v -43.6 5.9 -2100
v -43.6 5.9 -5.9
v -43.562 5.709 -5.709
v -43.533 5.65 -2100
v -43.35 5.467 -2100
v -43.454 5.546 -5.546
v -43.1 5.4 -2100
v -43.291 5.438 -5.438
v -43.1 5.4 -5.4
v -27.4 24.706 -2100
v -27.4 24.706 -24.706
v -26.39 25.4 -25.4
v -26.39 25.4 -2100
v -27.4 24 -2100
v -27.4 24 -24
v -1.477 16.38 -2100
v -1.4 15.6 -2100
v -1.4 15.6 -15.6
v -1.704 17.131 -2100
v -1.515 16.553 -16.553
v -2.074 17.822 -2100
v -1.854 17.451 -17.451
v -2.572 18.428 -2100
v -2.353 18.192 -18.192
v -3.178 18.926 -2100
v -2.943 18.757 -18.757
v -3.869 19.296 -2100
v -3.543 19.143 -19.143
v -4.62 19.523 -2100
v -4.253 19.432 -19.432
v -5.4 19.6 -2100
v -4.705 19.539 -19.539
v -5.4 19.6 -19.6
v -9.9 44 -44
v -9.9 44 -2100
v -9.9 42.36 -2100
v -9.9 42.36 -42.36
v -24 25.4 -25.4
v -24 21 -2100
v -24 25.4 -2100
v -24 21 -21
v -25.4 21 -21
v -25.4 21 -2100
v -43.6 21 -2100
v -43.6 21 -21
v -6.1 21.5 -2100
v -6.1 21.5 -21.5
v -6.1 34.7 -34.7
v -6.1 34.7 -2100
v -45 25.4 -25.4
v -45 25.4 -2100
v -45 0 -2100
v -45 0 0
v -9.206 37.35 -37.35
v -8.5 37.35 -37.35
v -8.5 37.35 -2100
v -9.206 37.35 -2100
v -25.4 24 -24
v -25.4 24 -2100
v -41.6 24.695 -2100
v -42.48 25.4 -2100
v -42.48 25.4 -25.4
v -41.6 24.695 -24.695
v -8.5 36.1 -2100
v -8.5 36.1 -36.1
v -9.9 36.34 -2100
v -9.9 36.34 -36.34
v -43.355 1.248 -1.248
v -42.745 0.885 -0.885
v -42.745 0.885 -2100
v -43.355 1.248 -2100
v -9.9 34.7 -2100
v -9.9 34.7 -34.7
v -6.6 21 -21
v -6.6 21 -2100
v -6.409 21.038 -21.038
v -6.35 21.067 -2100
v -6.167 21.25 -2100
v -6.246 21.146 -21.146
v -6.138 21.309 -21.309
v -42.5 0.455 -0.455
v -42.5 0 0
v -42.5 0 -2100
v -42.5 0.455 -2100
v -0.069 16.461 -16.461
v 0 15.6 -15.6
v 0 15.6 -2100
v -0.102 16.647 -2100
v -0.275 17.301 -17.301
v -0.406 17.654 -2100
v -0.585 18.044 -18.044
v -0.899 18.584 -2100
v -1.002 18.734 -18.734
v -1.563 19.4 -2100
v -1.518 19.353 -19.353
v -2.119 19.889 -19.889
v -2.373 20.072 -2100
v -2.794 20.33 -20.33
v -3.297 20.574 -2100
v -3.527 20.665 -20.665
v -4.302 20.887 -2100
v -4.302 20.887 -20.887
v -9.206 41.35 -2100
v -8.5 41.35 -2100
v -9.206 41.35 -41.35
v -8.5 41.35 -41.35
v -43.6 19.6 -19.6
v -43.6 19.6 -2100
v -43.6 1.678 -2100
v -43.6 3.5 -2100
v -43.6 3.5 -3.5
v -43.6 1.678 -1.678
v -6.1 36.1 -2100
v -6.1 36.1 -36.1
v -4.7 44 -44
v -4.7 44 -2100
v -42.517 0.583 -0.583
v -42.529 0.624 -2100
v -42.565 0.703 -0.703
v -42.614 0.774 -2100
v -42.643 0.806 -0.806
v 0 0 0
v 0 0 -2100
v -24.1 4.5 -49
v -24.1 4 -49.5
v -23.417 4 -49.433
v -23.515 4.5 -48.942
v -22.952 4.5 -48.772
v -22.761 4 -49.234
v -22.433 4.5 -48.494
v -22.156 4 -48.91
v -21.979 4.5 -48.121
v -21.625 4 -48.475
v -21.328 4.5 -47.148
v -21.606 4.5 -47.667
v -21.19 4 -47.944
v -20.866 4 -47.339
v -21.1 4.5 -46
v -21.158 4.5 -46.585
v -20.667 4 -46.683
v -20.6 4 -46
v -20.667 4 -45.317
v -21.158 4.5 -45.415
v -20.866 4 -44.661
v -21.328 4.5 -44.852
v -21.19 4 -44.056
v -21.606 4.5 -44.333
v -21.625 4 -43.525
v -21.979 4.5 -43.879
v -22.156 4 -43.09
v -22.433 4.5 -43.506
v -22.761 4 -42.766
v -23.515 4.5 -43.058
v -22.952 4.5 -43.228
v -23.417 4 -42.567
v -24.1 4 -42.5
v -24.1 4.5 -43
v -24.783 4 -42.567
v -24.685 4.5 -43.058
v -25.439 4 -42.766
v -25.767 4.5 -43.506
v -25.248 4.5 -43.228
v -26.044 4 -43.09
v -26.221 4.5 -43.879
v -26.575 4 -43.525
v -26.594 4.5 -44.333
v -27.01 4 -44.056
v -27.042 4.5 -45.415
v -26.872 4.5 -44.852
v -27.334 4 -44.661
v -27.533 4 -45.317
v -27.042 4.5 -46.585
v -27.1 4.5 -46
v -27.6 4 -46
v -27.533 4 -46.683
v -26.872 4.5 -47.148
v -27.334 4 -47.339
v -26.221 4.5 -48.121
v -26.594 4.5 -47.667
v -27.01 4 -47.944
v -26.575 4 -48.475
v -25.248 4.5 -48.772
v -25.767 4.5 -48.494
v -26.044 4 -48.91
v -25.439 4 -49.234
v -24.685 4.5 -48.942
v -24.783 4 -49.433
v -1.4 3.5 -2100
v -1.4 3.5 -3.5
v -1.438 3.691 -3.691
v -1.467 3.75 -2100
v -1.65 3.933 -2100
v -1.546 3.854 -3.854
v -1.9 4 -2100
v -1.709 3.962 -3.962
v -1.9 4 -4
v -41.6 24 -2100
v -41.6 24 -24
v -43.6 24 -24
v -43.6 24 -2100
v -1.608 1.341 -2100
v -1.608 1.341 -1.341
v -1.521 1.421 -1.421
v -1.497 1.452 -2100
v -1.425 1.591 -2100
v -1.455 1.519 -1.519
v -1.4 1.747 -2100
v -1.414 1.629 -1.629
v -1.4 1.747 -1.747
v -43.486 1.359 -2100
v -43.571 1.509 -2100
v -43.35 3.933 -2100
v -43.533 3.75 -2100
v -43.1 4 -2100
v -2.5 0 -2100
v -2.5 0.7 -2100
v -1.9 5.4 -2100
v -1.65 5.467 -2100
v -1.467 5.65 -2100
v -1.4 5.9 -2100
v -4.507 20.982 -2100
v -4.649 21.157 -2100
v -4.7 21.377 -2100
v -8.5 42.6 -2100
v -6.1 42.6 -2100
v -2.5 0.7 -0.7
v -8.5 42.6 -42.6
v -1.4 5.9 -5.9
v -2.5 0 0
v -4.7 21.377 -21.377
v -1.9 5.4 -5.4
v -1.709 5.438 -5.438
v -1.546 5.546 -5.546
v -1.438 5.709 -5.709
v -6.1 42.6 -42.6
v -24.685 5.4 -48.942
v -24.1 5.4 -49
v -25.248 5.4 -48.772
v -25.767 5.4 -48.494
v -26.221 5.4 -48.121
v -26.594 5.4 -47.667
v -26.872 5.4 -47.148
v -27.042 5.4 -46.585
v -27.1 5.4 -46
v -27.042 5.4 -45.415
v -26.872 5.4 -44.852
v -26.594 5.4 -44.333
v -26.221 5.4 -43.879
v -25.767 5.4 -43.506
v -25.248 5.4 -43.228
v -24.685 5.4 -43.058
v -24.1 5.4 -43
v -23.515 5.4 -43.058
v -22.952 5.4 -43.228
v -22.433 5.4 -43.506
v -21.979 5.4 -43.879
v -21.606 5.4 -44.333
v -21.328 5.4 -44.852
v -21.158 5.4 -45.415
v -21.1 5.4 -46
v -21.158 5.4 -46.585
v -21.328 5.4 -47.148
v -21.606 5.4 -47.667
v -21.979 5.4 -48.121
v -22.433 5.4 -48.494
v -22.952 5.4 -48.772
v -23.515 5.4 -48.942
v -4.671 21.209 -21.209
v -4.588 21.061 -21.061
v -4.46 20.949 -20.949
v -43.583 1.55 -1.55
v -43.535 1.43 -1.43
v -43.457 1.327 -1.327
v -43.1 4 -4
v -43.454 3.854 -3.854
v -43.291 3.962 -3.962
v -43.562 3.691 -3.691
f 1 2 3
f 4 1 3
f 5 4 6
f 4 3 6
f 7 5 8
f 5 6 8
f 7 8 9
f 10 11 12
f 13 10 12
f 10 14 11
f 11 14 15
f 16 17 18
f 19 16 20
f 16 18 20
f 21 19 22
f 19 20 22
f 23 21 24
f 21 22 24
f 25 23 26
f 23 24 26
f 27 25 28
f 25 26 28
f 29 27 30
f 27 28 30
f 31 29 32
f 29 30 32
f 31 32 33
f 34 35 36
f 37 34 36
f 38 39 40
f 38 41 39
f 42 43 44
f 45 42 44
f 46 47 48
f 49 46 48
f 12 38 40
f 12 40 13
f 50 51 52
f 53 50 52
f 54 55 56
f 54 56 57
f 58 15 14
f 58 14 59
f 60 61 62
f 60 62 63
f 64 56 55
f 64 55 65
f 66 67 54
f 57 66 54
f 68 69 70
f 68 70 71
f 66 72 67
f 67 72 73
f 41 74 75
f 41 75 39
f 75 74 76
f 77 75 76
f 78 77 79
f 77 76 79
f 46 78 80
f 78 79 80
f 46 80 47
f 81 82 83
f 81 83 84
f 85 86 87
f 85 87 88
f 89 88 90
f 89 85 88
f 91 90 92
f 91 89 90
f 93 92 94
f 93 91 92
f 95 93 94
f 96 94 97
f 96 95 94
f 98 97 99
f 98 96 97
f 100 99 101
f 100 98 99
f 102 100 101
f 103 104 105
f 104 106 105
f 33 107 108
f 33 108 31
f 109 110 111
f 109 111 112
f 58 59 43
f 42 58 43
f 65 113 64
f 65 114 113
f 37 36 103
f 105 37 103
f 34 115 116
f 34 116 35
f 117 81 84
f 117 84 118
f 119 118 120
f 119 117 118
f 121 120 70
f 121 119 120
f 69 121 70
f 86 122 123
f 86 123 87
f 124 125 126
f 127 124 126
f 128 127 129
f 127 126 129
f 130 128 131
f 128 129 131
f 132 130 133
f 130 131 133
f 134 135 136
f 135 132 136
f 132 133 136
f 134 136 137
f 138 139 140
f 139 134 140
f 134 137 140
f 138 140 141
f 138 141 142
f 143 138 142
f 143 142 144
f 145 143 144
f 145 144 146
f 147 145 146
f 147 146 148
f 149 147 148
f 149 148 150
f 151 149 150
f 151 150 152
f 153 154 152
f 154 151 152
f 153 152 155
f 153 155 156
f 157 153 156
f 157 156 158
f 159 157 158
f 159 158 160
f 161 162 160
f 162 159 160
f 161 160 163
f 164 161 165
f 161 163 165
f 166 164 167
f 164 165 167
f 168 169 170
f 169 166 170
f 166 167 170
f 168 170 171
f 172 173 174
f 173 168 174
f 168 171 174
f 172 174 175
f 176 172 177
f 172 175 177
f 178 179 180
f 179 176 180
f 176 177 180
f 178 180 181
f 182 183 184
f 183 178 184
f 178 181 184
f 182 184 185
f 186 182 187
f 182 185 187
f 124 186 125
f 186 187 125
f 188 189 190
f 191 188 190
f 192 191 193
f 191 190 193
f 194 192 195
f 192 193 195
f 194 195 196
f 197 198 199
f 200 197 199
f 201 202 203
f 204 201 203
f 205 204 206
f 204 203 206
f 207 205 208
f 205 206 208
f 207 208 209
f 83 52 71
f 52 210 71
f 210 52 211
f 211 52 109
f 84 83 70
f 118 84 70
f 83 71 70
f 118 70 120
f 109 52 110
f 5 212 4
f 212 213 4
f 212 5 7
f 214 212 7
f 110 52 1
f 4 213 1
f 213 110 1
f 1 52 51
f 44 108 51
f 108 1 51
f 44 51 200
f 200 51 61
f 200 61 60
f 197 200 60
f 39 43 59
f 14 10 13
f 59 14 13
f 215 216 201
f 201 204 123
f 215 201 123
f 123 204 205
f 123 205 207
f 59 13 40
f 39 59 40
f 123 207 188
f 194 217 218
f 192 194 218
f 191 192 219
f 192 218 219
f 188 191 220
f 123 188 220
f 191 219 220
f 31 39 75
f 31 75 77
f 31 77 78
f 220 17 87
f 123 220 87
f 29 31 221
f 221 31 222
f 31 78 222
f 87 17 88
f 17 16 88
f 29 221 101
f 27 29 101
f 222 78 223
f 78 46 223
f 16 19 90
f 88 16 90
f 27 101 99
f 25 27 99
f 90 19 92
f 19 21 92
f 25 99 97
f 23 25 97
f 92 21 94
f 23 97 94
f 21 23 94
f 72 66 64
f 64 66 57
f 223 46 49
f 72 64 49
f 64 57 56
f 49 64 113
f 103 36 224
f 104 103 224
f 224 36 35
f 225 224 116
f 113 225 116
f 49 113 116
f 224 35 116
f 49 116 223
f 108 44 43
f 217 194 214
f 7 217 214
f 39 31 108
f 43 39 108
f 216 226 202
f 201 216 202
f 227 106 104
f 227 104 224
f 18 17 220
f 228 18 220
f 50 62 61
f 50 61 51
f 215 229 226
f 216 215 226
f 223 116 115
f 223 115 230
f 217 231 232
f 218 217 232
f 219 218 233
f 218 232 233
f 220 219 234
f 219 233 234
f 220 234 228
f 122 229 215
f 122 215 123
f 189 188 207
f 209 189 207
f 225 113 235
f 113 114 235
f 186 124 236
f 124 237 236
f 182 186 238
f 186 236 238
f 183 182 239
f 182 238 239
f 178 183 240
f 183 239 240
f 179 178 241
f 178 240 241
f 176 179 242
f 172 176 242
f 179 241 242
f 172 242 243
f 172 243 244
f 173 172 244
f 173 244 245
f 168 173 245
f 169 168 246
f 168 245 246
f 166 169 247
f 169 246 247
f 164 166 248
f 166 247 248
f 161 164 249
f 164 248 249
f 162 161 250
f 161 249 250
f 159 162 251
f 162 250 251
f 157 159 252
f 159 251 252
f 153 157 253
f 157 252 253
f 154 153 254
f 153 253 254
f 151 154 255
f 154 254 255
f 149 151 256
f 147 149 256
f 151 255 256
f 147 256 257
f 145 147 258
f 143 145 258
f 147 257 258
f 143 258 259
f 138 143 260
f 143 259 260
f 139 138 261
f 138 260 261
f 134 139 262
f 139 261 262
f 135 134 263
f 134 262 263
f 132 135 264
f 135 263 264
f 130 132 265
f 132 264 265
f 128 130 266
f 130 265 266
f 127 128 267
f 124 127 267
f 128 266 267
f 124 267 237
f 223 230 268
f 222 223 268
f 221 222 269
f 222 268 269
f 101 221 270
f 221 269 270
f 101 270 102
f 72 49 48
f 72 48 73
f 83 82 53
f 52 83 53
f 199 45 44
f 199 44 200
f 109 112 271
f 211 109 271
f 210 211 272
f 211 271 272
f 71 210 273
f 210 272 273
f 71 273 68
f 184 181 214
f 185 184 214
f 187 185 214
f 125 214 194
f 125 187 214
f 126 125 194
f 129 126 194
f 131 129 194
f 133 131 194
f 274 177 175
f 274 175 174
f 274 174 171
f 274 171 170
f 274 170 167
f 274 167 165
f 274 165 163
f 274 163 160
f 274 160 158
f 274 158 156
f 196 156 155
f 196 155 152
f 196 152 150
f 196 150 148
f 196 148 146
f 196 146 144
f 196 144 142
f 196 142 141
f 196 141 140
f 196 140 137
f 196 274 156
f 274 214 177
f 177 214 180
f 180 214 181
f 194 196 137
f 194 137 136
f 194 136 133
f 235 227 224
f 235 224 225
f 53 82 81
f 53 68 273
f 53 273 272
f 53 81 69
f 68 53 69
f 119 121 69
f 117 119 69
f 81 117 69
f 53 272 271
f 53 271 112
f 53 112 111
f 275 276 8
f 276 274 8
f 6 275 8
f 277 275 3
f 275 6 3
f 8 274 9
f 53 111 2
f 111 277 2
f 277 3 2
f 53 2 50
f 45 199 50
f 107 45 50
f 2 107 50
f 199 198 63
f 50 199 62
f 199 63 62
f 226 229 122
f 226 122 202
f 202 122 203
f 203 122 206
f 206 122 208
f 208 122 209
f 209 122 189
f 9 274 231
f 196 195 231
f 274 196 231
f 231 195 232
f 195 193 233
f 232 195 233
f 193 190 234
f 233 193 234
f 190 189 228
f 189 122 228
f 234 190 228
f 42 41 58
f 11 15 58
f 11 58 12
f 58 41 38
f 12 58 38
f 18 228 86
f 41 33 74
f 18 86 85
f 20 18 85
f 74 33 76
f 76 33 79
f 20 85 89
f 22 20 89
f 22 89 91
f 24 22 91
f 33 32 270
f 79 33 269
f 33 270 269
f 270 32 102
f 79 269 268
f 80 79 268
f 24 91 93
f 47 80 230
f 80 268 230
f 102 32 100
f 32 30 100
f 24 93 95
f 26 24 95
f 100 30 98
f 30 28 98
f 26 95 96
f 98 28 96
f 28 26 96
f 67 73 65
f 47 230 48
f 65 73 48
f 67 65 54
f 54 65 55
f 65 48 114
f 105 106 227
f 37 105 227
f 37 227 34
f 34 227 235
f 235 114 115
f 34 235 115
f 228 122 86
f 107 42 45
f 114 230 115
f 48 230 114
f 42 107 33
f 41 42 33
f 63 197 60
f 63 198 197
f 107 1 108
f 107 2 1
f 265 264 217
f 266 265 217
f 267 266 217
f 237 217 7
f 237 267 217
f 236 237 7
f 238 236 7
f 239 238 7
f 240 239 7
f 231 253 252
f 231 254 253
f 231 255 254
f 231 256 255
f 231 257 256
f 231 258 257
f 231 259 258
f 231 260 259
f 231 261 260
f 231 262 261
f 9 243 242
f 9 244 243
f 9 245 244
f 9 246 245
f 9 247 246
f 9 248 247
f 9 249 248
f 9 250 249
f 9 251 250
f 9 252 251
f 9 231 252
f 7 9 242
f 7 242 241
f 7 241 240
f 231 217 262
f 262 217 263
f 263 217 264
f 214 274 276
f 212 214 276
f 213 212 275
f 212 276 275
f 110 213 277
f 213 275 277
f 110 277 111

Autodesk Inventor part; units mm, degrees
ref_plane "YZ Plane" through (0, 0, 0) normal (1, 0, 0) x (0, 1, 0)
ref_plane "XZ Plane" through (0, 0, 0) normal (0, 1, 0) x (-1, 0, 0)
ref_plane "XY Plane" through (0, 0, 0) normal (0, 0, 1) x (1, 0, 0)
sketch "Boceto1" plane through (0, 0, 0) normal (0, 0, 1) x (1, 0, 0)
  line L0 (-45, 21.0335) -> (-45, 0)
  line L1 (-43.1, 4) -> (-1.9, 4)
  line L2 (0, 0) -> (0, 15.6)
  line L3 (-4.7, 44) -> (-4.7, 21.3767)
  line L4 (-4.7, 44) -> (-9.9, 44)
  line L5 (-8.5, 42.6) -> (-6.1, 42.6)
  line L6 (-6.1, 36.1) -> (-8.5, 36.1)
  line L7 (-43.6, 19.6) -> (-5.4, 19.6)
  line L8 (-1.4, 15.6) -> (-1.4, 5.9)
  line L9 (-1.9, 5.4) -> (-43.1, 5.4)
  line L10 (-43.6, 5.9) -> (-43.6, 19.6)
  arc A0 (0, 15.6) -> (-4.3017, 20.8871) centre (-5.4, 15.6) ccw
  arc A1 (-1.4, 15.6) -> (-5.4, 19.6) centre (-5.4, 15.6) ccw
  line L11 (-1.4, 3.5) -> (-1.4, 1.7468)
  line L12 (-2.5, 0) -> (0, 0)
  line L13 (-6.1, 21.5) -> (-6.1, 34.7)
  line L14 (-6.1, 36.1) -> (-6.1, 42.6)
  line L15 (-43.6, 3.5) -> (-43.6, 1.6777)
  line L16 (-42.5, 0) -> (-45, 0)
  line L17 (-42.5, 0) -> (-42.5, 0.4554)
  line L18 (-2.5, 0) -> (-2.5, 0.7)
  line L19 (-43.6, 21) -> (-43.6, 24)
  line L20 (-42.48, 25.4) -> (-45, 25.4)
  line L21 (-45, 25.4) -> (-45, 21.0335)
  line L22 (-24, 21) -> (-24, 25.4)
  line L23 (-24, 25.4) -> (-26.39, 25.4)
  line L24 (-25.4, 24) -> (-25.4, 21)
  line L25 (-6.6, 21) -> (-24, 21)
  line L26 (-25.4, 21) -> (-43.6, 21)
  line L27 (-41.6, 24) -> (-43.6, 24)
  line L28 (-27.4, 24) -> (-25.4, 24)
  line L29 (-42.7447, 0.8853) -> (-43.3553, 1.2478)
  line L30 (-2.5, 0.7) -> (-1.6082, 1.3408)
  line L31 (-41.6, 24) -> (-41.6, 24.695)
  line L32 (-27.4, 24) -> (-27.4, 24.7058)
  line L33 (-42.48, 25.4) -> (-41.6, 24.695)
  line L34 (-27.4, 24.7058) -> (-26.39, 25.4)
  line L35 (-6.1, 34.7) -> (-9.9, 34.7)
  line L36 (-8.5, 37.35) -> (-8.5, 36.1)
  line L37 (-8.5, 41.35) -> (-8.5, 42.6)
  line L38 (-8.5, 37.35) -> (-9.2058, 37.35)
  line L39 (-8.5, 41.35) -> (-9.2058, 41.35)
  line L40 (-9.9, 44) -> (-9.9, 42.36)
  line L41 (-9.9, 42.36) -> (-9.2058, 41.35)
  line L42 (-9.9, 34.7) -> (-9.9, 36.34)
  line L43 (-9.9, 36.34) -> (-9.2058, 37.35)
  arc A2 (-6.6, 21) -> (-6.1, 21.5) centre (-6.6, 21.5) ccw
  arc A3 (-4.7, 21.3767) -> (-4.3017, 20.8871) centre (-4.2, 21.3767) ccw
  arc A4 (-1.9, 5.4) -> (-1.4, 5.9) centre (-1.9, 5.9) ccw
  arc A5 (-1.4, 3.5) -> (-1.9, 4) centre (-1.9, 3.5) ccw
  arc A6 (-1.6082, 1.3408) -> (-1.4, 1.7468) centre (-1.9, 1.7468) ccw
  arc A7 (-43.6, 5.9) -> (-43.1, 5.4) centre (-43.1, 5.9) ccw
  arc A8 (-43.1, 4) -> (-43.6, 3.5) centre (-43.1, 3.5) ccw
  arc A9 (-43.6, 1.6777) -> (-43.3553, 1.2478) centre (-43.1, 1.6777) ccw
  line L44 (0, 4) -> (0, 4.0335)
  arc A10 (-42.5, 0.4554) -> (-42.7447, 0.8853) centre (-43, 0.4554) ccw
  point P0 (-8.5, 41.975)
  point P1 (-42.5, 4)
  point P2 (-6.1, 39.35)
  point P3 (-42.5, 0.74)
  dimension "d16" = 5.4
  dimension "d17" = 4
  dimension "d32" = 1.4
  dimension "d35" = 1.4
  dimension "d37" = 3
  dimension "d38" = 25.4
  dimension "d44" = 18.2
  dimension "d50" = 0.7
  dimension "d53" = 40.3
  dimension "d54" = 37.5
  dimension "d55" = 1.4
  dimension "d57" = 17
  dimension "d62" = 30.7
  dimension "d63" = 35.7
  dimension "d64" = 4.4
  dimension "d66" = 3
  dimension "d69" = 4.4
  dimension "d71" = 3.4
  dimension "d72" = 3.4
  dimension "d73" = 0.88
  dimension "d74" = 1.01
  dimension "d75" = 34.5
  dimension "d76" = 38.7
  dimension "d77" = 0.695
  dimension "d78" = 0.7058
  dimension "d81" = 23
  dimension "d82" = 44
  dimension "d84" = 6.5
  dimension "d85" = 2.4
  dimension "d86" = 2.4
  dimension "d87" = 9.3
  dimension "d88" = 1.4
  dimension "d99" = 1.4
  dimension "d100" = 1.4
  dimension "d102" = 1.4
  dimension "d140" = 111
  dimension "d141" = 4
  dimension "d142" = 6.02
  dimension "d143" = 0.7058
  dimension "d144" = 0.7058
  dimension "d199" = 1.4
  dimension "d201" = 14.2
  dimension "d202" = 0.5
  dimension "d203" = 3.01
  dimension "d204" = 2
  dimension "d205" = 2.5
  dimension "d206" = 4.7
  dimension "d207" = 6.1
  dimension "d208" = 42.5
  dimension "d209" = 41.35
  dimension "d210" = 5.4
  dimension "d211" = 4
  dimension "d216" = 4.0335
  dimension "d218" = 0.74
  dimension "d219" = 0.5
  dimension "d220" = 45
  dimension "d221" = 5.2
  dimension "d225" = 1.4
extrude "Extrusión1" add sketch "Boceto1" against normal blind 2100
sketch "Boceto2" plane through (0, 0, 0) normal (1, 0, 0) x (0, 1, 0)
  line L0 (0, 0) -> (15.6, 0) projected
  line L1 (0, 0) -> (0, -2100) projected
  line L2 (15.6, -2100) -> (0, -2100) projected
  line L3 (15.6, 0) -> (15.6, -2100) projected
  line L4 (15.6, 0) -> (20.8871, 0) projected
  line L5 (15.6, 0) -> (15.6, -2100) projected
  line L6 (20.8871, -2100) -> (15.6, -2100) projected
  line L7 (20.8871, 0) -> (20.8871, -2100) projected
  line L8 (20.8871, 0) -> (21.3767, 0) projected
  line L9 (20.8871, 0) -> (20.8871, -2100) projected
  line L10 (21.3767, -2100) -> (20.8871, -2100) projected
  line L11 (21.3767, 0) -> (21.3767, -2100) projected
  line L12 (21.3767, 0) -> (44, 0) projected
  line L13 (21.3767, 0) -> (21.3767, -2100) projected
  line L14 (44, -2100) -> (21.3767, -2100) projected
  line L15 (44, 0) -> (44, -2100) projected
  line L16 (0, 0) -> (44, -44)
  line L17 (44, 0) -> (44, -44)
  line L18 (0, 0) -> (44, 0)
  dimension "d222" = 45
extrude "Extrusión2" cut sketch "Boceto2" against normal through all contours L0 L3 L16 | L4 L7 L16 L3 | L8 L11 L16 L7 | L12 L15 L16 L11
sketch "Boceto3" plane through (-43.1, 4, -2100) normal (0, -1, 0) x (1, 0, 0)
  circle A0 centre (19, 2054) radius 3
  line L0 (41.2, 2096) -> (0, 2096) projected
  line L1 (40.6, 2100) -> (40.6, 0) projected
  line L2 (0.6, 2100) -> (0.6, 0) projected
  point P0 (43.1, 2100)
  dimension "d227" = 6
  dimension "d228" = 42
  dimension "d229" = 21.6
  dimension "d230" = 18.4
hole "Agujero1" at (-24.1, 4, -46) direction (0, 1, 0) diameter 6 depth 1.4 countersink diameter 7 countersink angle 90
thread "Rosca1" size "M6x1" class "6H" standard "ISO Metric profile" full length
properties part number "SP40-01 MARCO BATIENTE - PAÑO FIJO 2100MM" material "Aluminio"
